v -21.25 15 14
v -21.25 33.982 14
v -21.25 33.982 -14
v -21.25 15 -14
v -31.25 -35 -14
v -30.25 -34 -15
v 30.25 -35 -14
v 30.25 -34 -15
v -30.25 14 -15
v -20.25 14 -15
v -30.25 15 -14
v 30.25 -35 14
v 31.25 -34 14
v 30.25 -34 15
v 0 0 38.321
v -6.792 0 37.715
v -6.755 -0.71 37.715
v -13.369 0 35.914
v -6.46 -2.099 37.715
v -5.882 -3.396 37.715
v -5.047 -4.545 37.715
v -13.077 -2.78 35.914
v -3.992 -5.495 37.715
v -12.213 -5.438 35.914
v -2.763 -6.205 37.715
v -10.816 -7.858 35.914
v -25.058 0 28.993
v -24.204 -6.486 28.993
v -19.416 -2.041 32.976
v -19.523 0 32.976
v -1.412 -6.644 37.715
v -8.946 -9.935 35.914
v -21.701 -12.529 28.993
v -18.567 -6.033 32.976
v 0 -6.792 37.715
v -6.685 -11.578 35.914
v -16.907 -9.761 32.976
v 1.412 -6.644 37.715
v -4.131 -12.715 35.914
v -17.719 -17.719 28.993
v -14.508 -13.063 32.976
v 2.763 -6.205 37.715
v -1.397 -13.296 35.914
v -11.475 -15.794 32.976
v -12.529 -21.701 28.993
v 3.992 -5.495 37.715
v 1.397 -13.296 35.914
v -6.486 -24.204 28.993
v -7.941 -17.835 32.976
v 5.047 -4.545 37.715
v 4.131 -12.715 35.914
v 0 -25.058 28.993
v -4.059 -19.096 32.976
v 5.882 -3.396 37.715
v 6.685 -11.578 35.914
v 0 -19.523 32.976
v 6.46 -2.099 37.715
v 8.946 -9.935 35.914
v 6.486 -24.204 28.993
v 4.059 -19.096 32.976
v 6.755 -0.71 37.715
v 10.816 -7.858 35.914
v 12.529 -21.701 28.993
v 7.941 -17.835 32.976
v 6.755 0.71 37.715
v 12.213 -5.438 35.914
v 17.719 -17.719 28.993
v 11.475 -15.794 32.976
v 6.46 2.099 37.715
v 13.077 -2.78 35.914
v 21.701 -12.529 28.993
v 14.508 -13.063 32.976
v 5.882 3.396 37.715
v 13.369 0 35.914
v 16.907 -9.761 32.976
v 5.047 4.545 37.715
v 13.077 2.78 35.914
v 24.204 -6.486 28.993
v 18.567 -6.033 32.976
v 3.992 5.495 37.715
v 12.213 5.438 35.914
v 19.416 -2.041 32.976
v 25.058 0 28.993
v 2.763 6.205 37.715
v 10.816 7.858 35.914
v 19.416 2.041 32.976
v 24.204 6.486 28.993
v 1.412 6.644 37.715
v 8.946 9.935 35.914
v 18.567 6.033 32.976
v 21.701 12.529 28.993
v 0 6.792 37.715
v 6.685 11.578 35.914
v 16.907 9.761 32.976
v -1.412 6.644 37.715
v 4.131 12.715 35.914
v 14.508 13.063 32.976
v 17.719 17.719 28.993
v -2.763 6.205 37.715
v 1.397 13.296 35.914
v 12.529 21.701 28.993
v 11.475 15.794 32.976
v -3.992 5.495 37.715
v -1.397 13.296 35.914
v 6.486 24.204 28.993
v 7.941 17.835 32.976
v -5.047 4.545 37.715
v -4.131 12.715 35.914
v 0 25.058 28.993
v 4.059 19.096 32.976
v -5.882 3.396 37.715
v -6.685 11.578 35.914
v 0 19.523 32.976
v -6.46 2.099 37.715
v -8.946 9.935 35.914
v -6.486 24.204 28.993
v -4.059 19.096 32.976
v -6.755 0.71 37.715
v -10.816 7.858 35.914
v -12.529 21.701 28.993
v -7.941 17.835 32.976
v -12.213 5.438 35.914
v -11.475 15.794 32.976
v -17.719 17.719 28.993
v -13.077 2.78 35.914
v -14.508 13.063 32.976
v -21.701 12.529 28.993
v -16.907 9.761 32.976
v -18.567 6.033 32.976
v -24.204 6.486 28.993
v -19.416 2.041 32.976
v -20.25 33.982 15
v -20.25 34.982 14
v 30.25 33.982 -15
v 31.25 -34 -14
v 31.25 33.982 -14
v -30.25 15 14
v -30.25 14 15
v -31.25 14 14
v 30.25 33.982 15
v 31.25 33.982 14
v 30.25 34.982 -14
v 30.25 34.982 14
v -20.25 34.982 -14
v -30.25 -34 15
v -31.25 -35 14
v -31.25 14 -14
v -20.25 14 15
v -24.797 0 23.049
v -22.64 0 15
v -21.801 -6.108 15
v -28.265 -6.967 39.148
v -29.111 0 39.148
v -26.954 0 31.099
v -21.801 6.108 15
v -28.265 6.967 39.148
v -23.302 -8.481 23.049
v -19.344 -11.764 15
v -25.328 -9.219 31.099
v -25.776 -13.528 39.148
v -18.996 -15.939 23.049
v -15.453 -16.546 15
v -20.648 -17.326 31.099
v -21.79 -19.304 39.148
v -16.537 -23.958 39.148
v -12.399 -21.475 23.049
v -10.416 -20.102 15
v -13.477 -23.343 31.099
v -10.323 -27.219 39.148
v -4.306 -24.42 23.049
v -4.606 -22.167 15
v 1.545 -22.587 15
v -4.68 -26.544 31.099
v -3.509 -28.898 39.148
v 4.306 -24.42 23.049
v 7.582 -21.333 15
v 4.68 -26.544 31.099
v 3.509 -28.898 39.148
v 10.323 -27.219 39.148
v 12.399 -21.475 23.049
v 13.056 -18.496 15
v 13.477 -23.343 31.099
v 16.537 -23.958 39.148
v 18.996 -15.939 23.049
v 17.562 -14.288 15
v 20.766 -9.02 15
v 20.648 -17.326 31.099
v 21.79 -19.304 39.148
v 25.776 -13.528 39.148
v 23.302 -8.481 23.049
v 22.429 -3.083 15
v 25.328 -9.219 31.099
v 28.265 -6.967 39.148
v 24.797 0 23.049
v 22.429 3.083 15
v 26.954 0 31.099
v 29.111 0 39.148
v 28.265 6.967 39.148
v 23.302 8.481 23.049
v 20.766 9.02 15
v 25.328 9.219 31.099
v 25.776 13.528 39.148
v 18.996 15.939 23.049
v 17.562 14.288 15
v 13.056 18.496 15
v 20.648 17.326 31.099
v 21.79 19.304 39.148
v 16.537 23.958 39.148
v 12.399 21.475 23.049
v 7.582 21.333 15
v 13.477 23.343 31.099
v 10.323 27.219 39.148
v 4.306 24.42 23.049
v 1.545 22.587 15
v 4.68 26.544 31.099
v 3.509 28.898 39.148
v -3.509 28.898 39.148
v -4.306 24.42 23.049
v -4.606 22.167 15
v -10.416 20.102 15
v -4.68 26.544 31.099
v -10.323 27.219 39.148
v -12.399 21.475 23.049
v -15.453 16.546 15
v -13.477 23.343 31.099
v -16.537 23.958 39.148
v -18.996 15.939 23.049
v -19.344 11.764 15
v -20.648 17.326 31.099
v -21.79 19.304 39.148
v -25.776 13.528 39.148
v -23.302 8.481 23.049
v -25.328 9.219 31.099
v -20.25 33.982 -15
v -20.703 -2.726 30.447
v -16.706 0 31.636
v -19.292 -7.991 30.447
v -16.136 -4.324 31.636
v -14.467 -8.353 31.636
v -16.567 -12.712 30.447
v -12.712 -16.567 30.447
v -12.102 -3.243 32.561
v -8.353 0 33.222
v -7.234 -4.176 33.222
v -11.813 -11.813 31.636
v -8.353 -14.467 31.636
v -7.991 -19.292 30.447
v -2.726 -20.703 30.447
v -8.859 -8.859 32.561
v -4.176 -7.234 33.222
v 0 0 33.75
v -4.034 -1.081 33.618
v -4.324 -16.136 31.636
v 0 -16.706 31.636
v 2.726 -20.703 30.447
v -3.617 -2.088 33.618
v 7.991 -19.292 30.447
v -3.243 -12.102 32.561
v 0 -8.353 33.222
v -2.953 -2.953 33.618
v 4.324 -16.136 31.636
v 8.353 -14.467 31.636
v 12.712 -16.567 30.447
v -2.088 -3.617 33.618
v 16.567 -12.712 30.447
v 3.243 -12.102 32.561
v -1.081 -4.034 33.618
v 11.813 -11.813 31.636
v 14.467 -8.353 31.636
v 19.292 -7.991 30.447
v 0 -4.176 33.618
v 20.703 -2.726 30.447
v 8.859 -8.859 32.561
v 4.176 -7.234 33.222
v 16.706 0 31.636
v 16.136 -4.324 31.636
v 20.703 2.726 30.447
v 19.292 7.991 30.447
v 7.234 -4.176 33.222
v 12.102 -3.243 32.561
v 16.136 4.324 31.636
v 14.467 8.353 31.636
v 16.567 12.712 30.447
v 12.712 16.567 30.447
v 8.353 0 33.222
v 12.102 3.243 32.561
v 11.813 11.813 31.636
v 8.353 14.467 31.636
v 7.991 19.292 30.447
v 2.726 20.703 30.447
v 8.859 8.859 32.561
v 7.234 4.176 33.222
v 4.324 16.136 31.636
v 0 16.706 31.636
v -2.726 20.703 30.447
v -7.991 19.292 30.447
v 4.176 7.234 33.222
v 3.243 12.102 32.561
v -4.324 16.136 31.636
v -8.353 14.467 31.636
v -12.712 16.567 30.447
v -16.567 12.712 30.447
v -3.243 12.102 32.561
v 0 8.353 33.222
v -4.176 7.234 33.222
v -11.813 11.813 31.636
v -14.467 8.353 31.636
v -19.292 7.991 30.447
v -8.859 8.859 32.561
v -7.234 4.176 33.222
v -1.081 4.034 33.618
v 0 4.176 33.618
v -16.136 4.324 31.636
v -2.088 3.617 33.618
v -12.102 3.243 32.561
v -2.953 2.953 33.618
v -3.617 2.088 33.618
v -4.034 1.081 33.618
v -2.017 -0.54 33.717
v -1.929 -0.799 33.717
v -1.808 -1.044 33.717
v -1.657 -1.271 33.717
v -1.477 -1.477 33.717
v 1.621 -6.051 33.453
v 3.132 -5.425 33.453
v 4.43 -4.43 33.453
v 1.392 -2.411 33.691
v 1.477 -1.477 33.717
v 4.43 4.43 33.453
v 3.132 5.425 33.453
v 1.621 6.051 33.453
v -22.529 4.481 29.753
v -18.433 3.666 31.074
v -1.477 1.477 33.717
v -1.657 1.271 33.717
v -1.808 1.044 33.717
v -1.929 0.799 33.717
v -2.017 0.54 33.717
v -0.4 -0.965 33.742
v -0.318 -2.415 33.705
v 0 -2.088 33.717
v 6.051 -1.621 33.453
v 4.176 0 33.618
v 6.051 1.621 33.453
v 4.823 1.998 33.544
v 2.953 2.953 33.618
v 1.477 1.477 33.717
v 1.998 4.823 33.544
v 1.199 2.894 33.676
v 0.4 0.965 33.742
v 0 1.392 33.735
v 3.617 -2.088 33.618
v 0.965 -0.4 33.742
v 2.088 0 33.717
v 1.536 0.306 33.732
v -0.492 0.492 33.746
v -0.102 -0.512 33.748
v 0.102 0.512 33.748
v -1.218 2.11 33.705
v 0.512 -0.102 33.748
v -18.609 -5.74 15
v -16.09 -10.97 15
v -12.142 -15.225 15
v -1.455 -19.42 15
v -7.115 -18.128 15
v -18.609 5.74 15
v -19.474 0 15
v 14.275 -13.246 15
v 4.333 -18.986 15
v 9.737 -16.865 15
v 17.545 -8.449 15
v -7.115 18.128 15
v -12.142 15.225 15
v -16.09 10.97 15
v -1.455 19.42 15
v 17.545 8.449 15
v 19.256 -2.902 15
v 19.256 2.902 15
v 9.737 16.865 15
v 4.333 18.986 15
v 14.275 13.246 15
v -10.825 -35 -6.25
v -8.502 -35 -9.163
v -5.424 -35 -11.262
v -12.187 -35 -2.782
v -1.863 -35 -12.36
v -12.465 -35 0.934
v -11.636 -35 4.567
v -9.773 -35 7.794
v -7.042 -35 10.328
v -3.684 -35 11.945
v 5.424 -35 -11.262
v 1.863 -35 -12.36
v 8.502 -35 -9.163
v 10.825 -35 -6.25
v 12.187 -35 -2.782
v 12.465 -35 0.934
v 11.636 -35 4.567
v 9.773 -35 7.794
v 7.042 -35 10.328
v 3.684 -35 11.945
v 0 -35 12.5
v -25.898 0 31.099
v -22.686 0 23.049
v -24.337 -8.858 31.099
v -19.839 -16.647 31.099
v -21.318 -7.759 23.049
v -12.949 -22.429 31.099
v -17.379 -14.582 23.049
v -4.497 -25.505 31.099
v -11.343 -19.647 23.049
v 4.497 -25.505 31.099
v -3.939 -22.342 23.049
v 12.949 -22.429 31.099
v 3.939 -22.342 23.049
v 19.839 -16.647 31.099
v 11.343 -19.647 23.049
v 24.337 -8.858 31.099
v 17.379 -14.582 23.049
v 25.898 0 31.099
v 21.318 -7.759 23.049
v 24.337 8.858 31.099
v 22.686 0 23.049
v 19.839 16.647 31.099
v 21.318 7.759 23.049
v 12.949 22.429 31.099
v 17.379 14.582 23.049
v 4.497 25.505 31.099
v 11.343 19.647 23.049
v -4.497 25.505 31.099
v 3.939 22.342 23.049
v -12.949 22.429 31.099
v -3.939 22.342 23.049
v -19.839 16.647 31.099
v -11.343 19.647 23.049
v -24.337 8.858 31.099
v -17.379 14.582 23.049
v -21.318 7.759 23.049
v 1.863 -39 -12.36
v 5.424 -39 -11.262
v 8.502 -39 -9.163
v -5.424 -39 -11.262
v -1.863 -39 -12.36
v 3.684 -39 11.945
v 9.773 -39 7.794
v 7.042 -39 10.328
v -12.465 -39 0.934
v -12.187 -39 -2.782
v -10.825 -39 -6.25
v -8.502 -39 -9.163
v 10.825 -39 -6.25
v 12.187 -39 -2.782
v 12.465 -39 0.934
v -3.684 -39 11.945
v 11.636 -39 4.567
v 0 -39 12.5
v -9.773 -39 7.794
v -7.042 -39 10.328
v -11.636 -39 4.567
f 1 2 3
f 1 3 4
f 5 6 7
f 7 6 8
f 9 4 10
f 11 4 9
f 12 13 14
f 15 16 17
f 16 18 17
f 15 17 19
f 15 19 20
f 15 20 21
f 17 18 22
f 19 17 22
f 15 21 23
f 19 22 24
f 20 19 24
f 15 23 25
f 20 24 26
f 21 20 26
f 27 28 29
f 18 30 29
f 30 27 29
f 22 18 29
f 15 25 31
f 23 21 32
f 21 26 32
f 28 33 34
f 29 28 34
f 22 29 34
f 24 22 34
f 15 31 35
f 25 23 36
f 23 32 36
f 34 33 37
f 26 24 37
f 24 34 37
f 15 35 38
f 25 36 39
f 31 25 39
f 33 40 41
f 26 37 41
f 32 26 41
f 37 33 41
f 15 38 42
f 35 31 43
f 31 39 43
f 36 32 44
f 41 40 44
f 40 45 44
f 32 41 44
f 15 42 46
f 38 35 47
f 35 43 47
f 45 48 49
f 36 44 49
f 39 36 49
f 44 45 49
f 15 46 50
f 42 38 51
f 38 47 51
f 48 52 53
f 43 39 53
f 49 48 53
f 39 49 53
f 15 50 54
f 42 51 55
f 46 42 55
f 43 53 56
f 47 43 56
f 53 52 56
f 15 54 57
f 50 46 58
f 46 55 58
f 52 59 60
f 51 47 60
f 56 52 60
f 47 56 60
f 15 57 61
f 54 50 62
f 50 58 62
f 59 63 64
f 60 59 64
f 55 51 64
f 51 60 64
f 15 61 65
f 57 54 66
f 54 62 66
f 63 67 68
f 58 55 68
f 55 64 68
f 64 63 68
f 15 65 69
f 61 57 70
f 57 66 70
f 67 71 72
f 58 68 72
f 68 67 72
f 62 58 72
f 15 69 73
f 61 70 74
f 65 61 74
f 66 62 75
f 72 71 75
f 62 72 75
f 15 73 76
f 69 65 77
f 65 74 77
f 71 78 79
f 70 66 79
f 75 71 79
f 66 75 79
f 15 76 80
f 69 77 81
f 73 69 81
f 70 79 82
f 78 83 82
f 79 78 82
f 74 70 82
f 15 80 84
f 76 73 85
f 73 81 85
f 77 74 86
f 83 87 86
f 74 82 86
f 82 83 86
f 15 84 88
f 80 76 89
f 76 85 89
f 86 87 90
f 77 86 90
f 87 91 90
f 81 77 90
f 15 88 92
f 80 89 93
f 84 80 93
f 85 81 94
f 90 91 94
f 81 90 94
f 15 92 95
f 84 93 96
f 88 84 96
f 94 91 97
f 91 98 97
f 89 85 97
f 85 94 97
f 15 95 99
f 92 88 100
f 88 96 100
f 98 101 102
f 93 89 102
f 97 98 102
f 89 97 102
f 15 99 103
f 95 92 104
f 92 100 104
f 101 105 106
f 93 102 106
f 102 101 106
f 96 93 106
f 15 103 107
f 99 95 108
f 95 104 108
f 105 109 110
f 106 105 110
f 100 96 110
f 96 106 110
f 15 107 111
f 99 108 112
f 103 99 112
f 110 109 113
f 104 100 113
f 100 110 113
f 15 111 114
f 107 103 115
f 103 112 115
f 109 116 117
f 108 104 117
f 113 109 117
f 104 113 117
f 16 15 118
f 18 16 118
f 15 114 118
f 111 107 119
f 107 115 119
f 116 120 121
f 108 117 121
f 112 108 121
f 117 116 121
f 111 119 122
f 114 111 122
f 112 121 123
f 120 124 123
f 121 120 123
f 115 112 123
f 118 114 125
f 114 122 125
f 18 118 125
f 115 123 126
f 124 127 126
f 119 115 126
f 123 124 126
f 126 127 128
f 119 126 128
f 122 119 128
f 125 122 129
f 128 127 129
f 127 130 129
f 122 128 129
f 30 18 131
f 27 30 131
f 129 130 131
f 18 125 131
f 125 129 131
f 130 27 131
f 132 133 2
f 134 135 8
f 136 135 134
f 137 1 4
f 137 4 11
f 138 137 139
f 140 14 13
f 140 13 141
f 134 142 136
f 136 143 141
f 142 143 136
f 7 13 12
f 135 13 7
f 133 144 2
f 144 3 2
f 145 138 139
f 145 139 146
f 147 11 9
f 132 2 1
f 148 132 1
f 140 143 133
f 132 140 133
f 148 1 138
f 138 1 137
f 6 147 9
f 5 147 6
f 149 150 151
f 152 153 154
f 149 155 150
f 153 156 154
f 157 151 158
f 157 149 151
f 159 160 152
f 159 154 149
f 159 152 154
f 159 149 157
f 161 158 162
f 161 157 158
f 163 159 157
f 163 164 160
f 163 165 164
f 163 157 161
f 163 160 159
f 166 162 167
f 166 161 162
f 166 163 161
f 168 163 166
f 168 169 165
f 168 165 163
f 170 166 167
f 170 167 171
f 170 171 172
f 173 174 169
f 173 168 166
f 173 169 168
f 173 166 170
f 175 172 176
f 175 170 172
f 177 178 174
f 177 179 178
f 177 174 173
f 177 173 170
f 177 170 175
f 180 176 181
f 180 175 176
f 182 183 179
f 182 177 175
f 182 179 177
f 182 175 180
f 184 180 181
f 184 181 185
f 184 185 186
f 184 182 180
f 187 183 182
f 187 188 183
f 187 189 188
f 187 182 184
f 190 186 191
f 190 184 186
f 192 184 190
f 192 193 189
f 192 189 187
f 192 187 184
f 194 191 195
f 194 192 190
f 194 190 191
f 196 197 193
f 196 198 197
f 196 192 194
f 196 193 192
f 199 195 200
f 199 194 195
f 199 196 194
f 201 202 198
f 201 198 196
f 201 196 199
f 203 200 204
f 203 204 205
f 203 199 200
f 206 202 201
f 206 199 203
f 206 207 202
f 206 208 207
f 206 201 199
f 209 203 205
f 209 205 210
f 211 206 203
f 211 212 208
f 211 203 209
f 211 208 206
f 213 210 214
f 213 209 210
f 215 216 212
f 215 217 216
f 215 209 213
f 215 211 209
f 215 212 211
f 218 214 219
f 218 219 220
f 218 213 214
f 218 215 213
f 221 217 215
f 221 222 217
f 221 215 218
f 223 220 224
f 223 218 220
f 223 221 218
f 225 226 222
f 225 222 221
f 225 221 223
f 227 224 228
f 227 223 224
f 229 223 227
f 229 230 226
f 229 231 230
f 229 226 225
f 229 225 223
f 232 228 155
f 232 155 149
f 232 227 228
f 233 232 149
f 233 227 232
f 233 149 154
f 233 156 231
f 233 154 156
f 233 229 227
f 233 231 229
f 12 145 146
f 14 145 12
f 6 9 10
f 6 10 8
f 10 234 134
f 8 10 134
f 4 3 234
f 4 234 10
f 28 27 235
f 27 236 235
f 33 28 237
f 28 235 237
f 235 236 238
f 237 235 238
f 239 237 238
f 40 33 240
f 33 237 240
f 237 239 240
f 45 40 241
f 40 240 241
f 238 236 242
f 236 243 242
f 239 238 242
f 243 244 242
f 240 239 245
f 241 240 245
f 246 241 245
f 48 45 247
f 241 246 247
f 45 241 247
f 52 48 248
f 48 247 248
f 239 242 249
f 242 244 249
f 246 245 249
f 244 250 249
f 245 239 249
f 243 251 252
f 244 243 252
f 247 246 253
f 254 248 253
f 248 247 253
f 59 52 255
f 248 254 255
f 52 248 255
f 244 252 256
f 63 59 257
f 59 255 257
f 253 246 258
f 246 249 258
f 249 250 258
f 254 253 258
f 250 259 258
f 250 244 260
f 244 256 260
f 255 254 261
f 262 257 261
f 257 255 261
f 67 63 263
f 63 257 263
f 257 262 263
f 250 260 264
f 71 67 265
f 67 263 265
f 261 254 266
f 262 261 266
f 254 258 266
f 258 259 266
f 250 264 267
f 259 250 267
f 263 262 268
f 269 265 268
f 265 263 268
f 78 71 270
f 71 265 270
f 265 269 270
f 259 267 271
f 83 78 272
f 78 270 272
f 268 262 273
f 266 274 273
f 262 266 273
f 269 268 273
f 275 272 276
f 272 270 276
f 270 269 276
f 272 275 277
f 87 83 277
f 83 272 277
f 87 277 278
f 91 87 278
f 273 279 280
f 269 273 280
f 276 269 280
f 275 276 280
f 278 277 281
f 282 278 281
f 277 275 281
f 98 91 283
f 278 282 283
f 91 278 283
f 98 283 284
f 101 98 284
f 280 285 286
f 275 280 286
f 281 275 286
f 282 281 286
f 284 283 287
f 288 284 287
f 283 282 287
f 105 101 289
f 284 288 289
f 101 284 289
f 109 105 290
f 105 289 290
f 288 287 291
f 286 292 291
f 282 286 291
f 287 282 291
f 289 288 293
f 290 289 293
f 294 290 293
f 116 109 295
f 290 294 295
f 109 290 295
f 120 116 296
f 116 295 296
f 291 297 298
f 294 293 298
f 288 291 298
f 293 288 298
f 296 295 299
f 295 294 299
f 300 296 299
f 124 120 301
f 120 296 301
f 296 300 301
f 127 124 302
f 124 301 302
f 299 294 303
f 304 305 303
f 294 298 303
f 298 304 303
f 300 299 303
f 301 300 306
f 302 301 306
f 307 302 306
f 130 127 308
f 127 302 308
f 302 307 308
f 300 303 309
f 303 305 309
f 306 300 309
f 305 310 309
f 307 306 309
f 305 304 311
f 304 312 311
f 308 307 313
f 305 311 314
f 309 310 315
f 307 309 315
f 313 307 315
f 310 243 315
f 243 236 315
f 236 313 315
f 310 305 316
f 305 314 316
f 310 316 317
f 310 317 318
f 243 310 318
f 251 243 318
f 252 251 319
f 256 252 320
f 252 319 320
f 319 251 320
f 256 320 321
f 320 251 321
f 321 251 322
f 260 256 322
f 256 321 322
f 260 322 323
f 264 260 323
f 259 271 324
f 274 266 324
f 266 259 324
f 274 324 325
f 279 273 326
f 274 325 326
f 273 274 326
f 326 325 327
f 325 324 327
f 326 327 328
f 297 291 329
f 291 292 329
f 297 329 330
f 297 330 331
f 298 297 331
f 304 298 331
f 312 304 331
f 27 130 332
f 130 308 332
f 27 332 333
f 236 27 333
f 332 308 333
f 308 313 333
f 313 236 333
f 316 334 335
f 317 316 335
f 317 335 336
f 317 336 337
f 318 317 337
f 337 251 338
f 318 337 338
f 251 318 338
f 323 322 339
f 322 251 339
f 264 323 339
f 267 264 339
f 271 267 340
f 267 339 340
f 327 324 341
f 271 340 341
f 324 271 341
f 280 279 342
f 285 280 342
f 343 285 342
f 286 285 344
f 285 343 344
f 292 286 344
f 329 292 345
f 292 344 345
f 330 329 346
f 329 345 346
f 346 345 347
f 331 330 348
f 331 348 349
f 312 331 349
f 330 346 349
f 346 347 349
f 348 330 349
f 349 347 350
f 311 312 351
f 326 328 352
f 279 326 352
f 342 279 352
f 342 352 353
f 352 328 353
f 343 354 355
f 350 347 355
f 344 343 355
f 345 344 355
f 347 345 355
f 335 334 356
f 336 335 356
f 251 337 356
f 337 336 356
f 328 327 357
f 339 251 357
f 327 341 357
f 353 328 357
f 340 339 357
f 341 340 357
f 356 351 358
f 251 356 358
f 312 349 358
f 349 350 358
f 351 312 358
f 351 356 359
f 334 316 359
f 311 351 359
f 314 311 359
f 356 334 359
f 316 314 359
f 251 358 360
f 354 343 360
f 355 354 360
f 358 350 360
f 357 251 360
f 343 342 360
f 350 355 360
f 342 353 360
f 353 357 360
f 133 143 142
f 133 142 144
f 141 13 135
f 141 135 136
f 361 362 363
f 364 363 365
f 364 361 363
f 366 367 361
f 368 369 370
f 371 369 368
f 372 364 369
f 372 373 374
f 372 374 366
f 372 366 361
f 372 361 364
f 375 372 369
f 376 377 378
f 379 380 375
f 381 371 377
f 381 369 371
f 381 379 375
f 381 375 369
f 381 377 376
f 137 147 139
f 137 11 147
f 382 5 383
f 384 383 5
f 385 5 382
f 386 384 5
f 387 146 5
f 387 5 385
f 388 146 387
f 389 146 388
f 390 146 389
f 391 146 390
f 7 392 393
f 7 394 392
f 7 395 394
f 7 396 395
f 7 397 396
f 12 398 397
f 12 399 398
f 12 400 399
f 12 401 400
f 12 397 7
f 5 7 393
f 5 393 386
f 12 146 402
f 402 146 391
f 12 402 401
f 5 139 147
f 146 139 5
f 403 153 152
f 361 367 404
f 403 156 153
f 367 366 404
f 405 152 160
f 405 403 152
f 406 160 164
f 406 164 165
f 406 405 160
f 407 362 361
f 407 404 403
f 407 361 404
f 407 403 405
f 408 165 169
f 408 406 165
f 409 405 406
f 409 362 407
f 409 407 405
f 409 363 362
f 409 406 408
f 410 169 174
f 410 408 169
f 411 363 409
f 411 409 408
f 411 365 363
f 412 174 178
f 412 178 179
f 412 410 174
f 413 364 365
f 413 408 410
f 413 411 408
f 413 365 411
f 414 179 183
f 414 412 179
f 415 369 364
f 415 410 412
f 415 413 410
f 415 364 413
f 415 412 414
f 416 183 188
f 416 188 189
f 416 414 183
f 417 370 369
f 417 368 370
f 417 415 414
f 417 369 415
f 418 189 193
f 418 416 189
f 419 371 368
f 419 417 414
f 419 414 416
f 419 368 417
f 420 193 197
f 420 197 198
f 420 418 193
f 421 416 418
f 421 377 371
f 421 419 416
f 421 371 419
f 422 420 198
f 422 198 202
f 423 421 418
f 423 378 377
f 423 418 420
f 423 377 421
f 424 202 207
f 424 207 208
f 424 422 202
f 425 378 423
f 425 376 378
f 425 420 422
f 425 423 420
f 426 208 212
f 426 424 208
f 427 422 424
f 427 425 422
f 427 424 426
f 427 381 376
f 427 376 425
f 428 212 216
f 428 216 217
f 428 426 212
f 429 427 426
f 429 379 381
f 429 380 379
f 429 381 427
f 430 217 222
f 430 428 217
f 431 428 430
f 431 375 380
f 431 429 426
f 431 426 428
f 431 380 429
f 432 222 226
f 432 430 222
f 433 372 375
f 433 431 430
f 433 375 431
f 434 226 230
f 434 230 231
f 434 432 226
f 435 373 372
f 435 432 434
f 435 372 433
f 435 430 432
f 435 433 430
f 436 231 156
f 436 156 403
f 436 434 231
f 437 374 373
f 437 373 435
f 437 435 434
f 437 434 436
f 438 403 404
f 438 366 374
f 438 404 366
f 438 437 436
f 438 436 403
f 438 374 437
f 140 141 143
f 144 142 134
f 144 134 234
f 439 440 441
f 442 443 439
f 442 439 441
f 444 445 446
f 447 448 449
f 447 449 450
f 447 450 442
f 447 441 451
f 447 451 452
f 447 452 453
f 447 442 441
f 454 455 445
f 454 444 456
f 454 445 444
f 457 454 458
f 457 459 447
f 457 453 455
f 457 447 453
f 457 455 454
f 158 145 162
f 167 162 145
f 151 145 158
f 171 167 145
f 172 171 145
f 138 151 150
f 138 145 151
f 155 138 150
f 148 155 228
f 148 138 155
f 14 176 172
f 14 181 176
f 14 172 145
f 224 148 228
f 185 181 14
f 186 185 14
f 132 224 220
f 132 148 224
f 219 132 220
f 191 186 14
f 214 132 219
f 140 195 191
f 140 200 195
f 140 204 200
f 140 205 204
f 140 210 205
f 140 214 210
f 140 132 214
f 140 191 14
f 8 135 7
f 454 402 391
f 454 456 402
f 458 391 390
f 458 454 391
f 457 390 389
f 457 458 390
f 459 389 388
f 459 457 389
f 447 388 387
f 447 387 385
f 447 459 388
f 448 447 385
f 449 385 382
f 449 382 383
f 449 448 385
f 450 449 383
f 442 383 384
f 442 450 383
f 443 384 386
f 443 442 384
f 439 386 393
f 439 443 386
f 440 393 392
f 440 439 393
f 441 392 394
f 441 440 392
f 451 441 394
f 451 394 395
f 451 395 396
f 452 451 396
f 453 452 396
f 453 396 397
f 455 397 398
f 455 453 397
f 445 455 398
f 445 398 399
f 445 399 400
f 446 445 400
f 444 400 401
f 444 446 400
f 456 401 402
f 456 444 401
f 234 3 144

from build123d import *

# Parameters (mm, degrees)
BOSS_EXTRUDE1_DEPTH = 15
SKETCH2_R           = 12.5
BOSS_EXTRUDE2_DEPTH = 4
CHAMFER1_SIZE       = 1


with BuildPart() as part:
    # Sketch1 → Boss-Extrude1 (new, symmetric)
    with BuildSketch(Plane.XY):
        Polygon((31.25, 34.98199207), (-21.25, 34.98199207), (-21.25, 15), (-31.25, 15), (-31.25, -35), (31.25, -35), align=None)
    extrude(amount=BOSS_EXTRUDE1_DEPTH, both=True)

    # Sketch2 → Boss-Extrude2 (add, symmetric)
    with BuildSketch(Plane.XZ.offset(35)):
        with Locations(Location((0, 0, 0), (0, 0, 90))):
            Circle(SKETCH2_R)
    extrude(amount=BOSS_EXTRUDE2_DEPTH, both=True)

    # Chamfer1
    chamfer1_edges = [part.edges().sort_by_distance(p)[0] for p in [
        (-31.25, 15, 0),
        (-21.25, 34.98199207, 0),
        (31.25, 34.98199207, 0),
        (31.25, -35, 0),
        (31.25, -0.009003965, 15),
        (5, 34.98199207, 15),
        (-21.25, 24.990996035, 15),
        (-26.25, 15, 15),
        (-31.25, -10, 15),
        (-26.25, 15, -15),
        (-21.25, 24.990996035, -15),
        (5, 34.98199207, -15),
        (31.25, -0.009003965, -15),
        (0, -35, -15),
        (-31.25, -10, -15),
        (0, -35, 15),
    ]]
    chamfer(chamfer1_edges, length=CHAMFER1_SIZE)

    # Sketch4 → Revolve1 (revolve)
    with BuildSketch(Plane(origin=(0, 0, 0), x_dir=(1, 0, 0), z_dir=(0, 1, 0))):
        Polygon((-22.640271435, -15), (-29.110747562, -39.148145657), (-19.473991816, -15), align=None)
    revolve(axis=Axis((0, 0, 0), (0, 0, 1)))


with BuildPart() as body_2:
    # Sketch5 → Revolve2 (revolve)
    with BuildSketch(Plane(origin=(0, 0, 0), x_dir=(1, 0, 0), z_dir=(0, 1, 0))):
        with BuildLine():
            Line((0, -33.750156277), (0, -38.321403444))
            ThreePointArc((0, -38.321403444), (-13.369092543, -35.913748433), (-25.058279875, -28.993319431))
            add(Edge.make_bspline(
                [(-25.058279875, -28.993319431), (-12.529139937, -33.750156277), (0, -33.750156277)],
                knots=[0, 0, 0, 0.5, 0.5, 0.5], degree=2))
        make_face()
    revolve(axis=Axis((0, 0, 0), (0, 0, 1)))


solid = Compound([part.part, body_2.part])
